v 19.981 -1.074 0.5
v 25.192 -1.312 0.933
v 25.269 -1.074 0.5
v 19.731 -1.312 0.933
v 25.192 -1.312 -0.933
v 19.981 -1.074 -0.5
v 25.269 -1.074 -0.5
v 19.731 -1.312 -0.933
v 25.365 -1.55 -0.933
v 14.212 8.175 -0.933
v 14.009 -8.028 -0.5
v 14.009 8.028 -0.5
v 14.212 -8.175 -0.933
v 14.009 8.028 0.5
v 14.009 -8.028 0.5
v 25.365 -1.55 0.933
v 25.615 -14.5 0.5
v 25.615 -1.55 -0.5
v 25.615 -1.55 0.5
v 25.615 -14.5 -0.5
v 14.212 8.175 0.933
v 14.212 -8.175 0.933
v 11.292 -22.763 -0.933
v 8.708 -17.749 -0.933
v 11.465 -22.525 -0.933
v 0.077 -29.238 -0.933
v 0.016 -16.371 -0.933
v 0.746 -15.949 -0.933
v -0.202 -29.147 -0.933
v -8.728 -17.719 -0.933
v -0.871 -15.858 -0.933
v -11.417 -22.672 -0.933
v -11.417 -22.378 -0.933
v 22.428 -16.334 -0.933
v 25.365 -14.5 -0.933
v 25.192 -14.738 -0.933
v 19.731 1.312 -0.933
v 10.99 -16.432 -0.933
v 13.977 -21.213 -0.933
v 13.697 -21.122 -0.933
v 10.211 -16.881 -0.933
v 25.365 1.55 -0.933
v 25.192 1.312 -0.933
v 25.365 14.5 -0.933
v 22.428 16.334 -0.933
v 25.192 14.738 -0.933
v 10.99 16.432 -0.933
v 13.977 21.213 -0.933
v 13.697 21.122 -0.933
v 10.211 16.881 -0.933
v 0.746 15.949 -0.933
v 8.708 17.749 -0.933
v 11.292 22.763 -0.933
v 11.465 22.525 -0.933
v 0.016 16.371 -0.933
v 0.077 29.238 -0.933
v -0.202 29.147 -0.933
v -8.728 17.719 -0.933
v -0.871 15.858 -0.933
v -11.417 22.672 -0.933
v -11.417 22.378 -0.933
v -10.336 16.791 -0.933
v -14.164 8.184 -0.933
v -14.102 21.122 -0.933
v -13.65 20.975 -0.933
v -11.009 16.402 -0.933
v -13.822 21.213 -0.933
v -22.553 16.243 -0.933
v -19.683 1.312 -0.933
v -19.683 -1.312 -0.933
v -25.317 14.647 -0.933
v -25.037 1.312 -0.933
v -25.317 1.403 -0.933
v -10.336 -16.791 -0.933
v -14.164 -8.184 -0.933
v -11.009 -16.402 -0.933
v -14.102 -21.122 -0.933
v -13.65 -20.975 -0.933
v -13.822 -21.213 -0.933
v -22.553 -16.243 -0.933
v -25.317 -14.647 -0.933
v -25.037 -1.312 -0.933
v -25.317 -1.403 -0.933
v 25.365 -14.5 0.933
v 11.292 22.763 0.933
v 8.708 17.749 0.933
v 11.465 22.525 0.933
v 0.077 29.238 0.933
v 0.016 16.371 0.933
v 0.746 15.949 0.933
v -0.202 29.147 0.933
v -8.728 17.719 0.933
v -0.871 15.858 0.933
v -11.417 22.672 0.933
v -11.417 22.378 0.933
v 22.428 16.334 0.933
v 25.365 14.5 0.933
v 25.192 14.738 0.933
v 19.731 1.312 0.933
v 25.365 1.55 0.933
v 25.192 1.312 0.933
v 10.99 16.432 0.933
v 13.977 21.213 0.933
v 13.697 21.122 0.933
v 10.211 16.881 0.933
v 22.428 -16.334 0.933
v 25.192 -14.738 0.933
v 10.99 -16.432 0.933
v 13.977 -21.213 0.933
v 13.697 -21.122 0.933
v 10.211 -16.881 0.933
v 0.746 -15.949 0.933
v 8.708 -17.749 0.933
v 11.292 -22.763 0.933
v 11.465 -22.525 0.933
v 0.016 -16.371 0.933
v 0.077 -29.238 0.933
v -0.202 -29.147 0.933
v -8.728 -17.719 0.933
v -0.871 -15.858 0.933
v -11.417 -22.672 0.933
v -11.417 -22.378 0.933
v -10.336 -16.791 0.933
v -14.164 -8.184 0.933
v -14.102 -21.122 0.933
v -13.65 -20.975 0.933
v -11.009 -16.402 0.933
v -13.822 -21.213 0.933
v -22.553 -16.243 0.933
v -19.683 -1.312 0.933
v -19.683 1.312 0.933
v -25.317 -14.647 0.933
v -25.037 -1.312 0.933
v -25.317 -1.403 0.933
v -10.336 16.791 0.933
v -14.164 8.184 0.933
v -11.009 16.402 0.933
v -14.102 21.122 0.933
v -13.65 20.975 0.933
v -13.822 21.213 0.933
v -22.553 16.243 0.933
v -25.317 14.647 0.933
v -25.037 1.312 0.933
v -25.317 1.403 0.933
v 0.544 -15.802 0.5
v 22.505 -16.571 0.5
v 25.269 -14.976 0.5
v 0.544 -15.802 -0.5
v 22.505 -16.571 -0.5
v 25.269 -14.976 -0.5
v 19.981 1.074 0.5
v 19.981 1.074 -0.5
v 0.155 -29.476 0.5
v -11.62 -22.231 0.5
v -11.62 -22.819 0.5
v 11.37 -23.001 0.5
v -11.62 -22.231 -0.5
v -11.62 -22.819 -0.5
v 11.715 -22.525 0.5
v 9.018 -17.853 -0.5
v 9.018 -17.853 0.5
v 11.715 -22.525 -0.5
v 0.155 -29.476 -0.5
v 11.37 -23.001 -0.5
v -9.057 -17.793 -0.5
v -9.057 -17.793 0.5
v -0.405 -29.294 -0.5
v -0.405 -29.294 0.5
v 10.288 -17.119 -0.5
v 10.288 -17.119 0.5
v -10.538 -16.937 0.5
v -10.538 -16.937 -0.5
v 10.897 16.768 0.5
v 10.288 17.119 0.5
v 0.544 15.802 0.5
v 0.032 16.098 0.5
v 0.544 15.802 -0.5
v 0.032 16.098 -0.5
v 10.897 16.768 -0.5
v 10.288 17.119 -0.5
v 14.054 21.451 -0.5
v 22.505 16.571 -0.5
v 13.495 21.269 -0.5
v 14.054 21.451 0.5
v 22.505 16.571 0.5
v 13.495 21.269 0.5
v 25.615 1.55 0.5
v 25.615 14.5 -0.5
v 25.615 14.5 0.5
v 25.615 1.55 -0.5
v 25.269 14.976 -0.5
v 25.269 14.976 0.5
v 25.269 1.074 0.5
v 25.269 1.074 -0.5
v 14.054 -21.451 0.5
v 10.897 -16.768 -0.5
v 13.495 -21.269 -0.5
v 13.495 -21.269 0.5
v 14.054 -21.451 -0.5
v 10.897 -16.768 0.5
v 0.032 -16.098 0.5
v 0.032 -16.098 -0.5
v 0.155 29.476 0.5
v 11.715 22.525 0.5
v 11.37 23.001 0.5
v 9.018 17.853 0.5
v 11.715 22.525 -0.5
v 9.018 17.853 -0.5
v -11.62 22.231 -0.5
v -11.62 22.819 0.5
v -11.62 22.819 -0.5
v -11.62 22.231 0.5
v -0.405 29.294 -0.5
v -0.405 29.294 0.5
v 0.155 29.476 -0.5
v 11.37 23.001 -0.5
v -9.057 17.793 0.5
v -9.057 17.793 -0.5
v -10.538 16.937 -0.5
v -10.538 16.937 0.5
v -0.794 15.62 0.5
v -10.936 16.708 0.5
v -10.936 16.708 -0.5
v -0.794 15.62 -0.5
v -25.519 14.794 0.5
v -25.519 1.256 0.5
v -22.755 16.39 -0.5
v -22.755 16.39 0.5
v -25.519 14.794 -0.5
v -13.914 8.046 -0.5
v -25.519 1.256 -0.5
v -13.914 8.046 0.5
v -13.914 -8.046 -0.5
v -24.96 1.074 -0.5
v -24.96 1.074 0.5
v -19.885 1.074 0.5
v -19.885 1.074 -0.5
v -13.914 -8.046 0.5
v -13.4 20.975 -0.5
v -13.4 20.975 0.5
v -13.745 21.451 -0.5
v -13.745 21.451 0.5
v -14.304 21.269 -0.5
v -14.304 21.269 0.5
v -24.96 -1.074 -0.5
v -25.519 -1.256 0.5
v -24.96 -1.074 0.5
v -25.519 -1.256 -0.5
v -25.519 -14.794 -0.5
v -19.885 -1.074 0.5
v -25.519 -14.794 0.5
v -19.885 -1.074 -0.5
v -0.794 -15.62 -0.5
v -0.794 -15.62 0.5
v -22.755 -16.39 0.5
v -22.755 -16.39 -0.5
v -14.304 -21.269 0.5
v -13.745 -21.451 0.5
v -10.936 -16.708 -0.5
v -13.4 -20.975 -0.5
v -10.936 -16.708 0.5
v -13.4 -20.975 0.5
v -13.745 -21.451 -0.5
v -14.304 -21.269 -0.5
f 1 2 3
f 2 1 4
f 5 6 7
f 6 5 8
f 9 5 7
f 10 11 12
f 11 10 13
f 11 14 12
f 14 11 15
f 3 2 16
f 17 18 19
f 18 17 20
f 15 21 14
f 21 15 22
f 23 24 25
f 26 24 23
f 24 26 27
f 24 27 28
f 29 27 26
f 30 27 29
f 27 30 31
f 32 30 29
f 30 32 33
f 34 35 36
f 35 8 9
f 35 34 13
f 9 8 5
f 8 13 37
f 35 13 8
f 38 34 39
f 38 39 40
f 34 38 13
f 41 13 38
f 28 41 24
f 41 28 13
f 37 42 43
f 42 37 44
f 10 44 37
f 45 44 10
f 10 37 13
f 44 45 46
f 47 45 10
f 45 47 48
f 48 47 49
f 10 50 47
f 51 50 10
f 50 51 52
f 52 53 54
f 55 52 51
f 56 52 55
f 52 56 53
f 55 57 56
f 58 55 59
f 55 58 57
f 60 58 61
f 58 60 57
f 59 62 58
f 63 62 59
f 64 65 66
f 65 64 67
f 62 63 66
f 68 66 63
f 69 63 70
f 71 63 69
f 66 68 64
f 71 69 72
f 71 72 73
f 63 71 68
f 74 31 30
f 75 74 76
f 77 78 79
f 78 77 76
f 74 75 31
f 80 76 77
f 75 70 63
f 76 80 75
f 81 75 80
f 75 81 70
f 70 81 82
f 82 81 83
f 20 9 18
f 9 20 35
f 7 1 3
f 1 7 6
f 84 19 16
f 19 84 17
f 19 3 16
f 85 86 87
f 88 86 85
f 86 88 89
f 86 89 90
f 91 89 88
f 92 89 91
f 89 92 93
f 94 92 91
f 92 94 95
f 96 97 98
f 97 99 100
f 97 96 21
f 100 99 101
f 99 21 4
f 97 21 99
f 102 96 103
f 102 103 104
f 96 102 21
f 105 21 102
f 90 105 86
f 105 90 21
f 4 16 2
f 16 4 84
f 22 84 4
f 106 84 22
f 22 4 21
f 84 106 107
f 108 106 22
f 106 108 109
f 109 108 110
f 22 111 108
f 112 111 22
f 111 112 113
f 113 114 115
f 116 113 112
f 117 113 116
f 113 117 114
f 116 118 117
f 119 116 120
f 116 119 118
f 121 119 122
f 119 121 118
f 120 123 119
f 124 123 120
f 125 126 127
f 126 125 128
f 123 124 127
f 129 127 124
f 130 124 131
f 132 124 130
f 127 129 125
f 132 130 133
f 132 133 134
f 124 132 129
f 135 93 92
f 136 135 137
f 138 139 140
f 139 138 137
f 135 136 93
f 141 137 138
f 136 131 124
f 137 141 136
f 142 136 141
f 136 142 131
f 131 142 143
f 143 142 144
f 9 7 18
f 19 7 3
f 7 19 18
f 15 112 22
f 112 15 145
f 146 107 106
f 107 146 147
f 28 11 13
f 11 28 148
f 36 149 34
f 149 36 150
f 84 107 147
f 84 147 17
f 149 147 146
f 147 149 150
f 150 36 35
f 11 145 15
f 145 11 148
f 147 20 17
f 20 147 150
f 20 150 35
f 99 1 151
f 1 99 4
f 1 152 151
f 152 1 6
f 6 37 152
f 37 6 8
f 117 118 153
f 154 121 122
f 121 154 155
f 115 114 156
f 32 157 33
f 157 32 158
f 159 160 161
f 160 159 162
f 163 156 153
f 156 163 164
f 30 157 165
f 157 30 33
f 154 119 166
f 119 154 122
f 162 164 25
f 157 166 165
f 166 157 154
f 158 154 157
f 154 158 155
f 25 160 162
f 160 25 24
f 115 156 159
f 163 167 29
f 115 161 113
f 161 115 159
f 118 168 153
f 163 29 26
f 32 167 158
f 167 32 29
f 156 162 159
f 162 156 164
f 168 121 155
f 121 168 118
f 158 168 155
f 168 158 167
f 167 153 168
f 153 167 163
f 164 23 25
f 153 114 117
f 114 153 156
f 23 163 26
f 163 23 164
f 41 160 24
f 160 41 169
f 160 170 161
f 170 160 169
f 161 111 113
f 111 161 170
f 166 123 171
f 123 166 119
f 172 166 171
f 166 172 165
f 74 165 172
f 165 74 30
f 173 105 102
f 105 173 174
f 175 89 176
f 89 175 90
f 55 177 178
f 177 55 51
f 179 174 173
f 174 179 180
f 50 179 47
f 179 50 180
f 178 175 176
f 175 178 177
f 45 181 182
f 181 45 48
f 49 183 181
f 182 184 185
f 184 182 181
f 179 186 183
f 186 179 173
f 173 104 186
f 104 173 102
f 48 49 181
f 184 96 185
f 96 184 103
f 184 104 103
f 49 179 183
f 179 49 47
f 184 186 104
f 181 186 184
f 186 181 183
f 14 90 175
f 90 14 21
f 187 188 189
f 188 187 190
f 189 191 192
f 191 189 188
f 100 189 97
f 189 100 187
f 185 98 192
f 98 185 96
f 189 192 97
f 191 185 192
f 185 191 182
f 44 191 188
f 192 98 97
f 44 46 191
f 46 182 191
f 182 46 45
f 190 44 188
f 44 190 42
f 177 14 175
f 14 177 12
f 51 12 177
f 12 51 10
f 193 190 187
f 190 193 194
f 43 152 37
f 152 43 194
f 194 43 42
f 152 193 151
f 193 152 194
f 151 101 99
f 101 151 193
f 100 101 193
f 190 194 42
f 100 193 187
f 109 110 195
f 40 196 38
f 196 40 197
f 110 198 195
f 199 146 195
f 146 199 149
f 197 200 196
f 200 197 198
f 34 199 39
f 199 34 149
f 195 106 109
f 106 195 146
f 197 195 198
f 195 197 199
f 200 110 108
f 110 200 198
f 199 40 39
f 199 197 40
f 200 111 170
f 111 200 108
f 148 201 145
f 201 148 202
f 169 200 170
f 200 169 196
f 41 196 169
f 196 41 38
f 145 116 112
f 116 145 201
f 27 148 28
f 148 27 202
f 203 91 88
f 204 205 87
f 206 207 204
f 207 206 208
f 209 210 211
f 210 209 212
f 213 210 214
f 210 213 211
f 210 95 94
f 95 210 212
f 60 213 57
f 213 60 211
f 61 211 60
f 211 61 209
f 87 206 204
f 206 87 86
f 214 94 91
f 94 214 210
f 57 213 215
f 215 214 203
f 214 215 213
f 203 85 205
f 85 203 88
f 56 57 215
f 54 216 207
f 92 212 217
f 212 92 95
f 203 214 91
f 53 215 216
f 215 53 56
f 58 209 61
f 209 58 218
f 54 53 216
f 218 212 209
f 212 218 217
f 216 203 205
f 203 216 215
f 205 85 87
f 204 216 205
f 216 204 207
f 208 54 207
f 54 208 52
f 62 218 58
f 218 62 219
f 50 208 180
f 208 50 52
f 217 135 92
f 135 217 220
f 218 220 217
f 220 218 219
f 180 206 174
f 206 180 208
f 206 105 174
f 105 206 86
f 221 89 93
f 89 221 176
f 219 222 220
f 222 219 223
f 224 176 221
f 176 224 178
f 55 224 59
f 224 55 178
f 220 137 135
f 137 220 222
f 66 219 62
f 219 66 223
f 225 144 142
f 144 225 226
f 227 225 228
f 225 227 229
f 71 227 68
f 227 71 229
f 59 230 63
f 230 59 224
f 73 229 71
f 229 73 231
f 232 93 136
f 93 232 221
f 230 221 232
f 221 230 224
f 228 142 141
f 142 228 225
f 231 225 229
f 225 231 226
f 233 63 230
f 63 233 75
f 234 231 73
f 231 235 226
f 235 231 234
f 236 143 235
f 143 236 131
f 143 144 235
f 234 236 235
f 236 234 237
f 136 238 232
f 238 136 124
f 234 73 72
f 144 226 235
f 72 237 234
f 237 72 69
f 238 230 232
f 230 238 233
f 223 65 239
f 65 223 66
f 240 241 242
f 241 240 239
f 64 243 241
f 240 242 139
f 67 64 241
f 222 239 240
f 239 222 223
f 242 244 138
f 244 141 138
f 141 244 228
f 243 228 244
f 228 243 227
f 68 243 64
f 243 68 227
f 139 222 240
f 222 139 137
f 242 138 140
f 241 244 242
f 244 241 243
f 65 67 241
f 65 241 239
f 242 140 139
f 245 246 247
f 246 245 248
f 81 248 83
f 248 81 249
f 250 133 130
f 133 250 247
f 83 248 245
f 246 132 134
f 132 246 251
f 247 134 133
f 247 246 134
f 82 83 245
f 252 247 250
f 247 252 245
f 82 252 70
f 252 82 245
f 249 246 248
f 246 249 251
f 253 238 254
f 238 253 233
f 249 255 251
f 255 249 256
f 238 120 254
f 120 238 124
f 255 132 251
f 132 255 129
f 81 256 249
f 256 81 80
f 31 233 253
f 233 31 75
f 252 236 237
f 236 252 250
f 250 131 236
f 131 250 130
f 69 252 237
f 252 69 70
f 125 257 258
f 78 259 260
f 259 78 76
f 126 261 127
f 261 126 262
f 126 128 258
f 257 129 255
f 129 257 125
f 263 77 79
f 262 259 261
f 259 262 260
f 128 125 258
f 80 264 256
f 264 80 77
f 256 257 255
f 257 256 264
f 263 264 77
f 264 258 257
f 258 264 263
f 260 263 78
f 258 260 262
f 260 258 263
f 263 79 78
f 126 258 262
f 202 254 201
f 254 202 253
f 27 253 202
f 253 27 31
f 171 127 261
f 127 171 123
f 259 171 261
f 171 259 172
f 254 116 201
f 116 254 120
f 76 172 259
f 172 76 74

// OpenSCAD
// --- BUILD TYPE ---

part = 1;

// --- CONFIG ---

HEIGHT = 2;
HOLE_LENGTH = 6;
LEG_WIDTH = 10;
LEG_LENGTH = 20;
NODE_RADIUS = 30;
CORNER_RADIUS = 0.5;

// Change these to e.g. print arbitrary press fit polyhedral faces,
// irregular honeycombs, etc.

ANGLE = 2 * acos(1/sqrt(3));
SIDES = 6;
LEGS = 2;

// Set $fs to change arc precision
// (To use $fa instead, set $fs arbitrarily small and make $fa larger)
$fa = 0.01;
$fs = 1;

// --- DERIVED VALUES ---

d = HEIGHT - CORNER_RADIUS*2;
hl = HOLE_LENGTH + CORNER_RADIUS;
hw = HEIGHT + CORNER_RADIUS * 2 + 0.1;
w = LEG_WIDTH - CORNER_RADIUS * 2;
l = LEG_LENGTH - CORNER_RADIUS * 2;
r = NODE_RADIUS - CORNER_RADIUS * 2;
ir = NODE_RADIUS + CORNER_RADIUS - HOLE_LENGTH * 2 / cos(180 / SIDES);
apothem = NODE_RADIUS * cos(180 / SIDES);

// --- BUILD ---

mink() {
  if (floor(part / 2) % 2 == 1)
    edge();
  if (part % 2 == 1)
    node();
}

// --- STUFF ---

module mink() {
  minkowski() {
    children();
    sphere(CORNER_RADIUS);
  }
}

module disc(r) {
  cylinder(h=d, r1=r, r2=r);
}

module hole2() {
  square([hl * 2, hw], center=true);
}

module hole3() {
  linear_extrude(d * 10, center=true)
  hole2();
}

module leg() {
  difference() {
    hull() {
      disc(w / 2);
      translate([l - w, 0, 0])
      disc(w / 2);
    }
    translate([l - w / 2 ,0, 0])
    hole3();
  }
}

module edge() {
  for (i=[0:LEGS-1])
    rotate([0, 0, ANGLE * i])
    leg();
}

module node() {
  linear_extrude(height=d, center=true) {
    difference() {
      rotate(360 / SIDES / 2)
      circle(r, $fn=SIDES);
      rotate(360 / SIDES / 2)
      circle(ir, $fn=SIDES);
      for (i = [0:SIDES - 1]) {
        rotate(360 / SIDES * i)
        translate([apothem, 0, 0])
        hole2();
      }
    }
  }
}
